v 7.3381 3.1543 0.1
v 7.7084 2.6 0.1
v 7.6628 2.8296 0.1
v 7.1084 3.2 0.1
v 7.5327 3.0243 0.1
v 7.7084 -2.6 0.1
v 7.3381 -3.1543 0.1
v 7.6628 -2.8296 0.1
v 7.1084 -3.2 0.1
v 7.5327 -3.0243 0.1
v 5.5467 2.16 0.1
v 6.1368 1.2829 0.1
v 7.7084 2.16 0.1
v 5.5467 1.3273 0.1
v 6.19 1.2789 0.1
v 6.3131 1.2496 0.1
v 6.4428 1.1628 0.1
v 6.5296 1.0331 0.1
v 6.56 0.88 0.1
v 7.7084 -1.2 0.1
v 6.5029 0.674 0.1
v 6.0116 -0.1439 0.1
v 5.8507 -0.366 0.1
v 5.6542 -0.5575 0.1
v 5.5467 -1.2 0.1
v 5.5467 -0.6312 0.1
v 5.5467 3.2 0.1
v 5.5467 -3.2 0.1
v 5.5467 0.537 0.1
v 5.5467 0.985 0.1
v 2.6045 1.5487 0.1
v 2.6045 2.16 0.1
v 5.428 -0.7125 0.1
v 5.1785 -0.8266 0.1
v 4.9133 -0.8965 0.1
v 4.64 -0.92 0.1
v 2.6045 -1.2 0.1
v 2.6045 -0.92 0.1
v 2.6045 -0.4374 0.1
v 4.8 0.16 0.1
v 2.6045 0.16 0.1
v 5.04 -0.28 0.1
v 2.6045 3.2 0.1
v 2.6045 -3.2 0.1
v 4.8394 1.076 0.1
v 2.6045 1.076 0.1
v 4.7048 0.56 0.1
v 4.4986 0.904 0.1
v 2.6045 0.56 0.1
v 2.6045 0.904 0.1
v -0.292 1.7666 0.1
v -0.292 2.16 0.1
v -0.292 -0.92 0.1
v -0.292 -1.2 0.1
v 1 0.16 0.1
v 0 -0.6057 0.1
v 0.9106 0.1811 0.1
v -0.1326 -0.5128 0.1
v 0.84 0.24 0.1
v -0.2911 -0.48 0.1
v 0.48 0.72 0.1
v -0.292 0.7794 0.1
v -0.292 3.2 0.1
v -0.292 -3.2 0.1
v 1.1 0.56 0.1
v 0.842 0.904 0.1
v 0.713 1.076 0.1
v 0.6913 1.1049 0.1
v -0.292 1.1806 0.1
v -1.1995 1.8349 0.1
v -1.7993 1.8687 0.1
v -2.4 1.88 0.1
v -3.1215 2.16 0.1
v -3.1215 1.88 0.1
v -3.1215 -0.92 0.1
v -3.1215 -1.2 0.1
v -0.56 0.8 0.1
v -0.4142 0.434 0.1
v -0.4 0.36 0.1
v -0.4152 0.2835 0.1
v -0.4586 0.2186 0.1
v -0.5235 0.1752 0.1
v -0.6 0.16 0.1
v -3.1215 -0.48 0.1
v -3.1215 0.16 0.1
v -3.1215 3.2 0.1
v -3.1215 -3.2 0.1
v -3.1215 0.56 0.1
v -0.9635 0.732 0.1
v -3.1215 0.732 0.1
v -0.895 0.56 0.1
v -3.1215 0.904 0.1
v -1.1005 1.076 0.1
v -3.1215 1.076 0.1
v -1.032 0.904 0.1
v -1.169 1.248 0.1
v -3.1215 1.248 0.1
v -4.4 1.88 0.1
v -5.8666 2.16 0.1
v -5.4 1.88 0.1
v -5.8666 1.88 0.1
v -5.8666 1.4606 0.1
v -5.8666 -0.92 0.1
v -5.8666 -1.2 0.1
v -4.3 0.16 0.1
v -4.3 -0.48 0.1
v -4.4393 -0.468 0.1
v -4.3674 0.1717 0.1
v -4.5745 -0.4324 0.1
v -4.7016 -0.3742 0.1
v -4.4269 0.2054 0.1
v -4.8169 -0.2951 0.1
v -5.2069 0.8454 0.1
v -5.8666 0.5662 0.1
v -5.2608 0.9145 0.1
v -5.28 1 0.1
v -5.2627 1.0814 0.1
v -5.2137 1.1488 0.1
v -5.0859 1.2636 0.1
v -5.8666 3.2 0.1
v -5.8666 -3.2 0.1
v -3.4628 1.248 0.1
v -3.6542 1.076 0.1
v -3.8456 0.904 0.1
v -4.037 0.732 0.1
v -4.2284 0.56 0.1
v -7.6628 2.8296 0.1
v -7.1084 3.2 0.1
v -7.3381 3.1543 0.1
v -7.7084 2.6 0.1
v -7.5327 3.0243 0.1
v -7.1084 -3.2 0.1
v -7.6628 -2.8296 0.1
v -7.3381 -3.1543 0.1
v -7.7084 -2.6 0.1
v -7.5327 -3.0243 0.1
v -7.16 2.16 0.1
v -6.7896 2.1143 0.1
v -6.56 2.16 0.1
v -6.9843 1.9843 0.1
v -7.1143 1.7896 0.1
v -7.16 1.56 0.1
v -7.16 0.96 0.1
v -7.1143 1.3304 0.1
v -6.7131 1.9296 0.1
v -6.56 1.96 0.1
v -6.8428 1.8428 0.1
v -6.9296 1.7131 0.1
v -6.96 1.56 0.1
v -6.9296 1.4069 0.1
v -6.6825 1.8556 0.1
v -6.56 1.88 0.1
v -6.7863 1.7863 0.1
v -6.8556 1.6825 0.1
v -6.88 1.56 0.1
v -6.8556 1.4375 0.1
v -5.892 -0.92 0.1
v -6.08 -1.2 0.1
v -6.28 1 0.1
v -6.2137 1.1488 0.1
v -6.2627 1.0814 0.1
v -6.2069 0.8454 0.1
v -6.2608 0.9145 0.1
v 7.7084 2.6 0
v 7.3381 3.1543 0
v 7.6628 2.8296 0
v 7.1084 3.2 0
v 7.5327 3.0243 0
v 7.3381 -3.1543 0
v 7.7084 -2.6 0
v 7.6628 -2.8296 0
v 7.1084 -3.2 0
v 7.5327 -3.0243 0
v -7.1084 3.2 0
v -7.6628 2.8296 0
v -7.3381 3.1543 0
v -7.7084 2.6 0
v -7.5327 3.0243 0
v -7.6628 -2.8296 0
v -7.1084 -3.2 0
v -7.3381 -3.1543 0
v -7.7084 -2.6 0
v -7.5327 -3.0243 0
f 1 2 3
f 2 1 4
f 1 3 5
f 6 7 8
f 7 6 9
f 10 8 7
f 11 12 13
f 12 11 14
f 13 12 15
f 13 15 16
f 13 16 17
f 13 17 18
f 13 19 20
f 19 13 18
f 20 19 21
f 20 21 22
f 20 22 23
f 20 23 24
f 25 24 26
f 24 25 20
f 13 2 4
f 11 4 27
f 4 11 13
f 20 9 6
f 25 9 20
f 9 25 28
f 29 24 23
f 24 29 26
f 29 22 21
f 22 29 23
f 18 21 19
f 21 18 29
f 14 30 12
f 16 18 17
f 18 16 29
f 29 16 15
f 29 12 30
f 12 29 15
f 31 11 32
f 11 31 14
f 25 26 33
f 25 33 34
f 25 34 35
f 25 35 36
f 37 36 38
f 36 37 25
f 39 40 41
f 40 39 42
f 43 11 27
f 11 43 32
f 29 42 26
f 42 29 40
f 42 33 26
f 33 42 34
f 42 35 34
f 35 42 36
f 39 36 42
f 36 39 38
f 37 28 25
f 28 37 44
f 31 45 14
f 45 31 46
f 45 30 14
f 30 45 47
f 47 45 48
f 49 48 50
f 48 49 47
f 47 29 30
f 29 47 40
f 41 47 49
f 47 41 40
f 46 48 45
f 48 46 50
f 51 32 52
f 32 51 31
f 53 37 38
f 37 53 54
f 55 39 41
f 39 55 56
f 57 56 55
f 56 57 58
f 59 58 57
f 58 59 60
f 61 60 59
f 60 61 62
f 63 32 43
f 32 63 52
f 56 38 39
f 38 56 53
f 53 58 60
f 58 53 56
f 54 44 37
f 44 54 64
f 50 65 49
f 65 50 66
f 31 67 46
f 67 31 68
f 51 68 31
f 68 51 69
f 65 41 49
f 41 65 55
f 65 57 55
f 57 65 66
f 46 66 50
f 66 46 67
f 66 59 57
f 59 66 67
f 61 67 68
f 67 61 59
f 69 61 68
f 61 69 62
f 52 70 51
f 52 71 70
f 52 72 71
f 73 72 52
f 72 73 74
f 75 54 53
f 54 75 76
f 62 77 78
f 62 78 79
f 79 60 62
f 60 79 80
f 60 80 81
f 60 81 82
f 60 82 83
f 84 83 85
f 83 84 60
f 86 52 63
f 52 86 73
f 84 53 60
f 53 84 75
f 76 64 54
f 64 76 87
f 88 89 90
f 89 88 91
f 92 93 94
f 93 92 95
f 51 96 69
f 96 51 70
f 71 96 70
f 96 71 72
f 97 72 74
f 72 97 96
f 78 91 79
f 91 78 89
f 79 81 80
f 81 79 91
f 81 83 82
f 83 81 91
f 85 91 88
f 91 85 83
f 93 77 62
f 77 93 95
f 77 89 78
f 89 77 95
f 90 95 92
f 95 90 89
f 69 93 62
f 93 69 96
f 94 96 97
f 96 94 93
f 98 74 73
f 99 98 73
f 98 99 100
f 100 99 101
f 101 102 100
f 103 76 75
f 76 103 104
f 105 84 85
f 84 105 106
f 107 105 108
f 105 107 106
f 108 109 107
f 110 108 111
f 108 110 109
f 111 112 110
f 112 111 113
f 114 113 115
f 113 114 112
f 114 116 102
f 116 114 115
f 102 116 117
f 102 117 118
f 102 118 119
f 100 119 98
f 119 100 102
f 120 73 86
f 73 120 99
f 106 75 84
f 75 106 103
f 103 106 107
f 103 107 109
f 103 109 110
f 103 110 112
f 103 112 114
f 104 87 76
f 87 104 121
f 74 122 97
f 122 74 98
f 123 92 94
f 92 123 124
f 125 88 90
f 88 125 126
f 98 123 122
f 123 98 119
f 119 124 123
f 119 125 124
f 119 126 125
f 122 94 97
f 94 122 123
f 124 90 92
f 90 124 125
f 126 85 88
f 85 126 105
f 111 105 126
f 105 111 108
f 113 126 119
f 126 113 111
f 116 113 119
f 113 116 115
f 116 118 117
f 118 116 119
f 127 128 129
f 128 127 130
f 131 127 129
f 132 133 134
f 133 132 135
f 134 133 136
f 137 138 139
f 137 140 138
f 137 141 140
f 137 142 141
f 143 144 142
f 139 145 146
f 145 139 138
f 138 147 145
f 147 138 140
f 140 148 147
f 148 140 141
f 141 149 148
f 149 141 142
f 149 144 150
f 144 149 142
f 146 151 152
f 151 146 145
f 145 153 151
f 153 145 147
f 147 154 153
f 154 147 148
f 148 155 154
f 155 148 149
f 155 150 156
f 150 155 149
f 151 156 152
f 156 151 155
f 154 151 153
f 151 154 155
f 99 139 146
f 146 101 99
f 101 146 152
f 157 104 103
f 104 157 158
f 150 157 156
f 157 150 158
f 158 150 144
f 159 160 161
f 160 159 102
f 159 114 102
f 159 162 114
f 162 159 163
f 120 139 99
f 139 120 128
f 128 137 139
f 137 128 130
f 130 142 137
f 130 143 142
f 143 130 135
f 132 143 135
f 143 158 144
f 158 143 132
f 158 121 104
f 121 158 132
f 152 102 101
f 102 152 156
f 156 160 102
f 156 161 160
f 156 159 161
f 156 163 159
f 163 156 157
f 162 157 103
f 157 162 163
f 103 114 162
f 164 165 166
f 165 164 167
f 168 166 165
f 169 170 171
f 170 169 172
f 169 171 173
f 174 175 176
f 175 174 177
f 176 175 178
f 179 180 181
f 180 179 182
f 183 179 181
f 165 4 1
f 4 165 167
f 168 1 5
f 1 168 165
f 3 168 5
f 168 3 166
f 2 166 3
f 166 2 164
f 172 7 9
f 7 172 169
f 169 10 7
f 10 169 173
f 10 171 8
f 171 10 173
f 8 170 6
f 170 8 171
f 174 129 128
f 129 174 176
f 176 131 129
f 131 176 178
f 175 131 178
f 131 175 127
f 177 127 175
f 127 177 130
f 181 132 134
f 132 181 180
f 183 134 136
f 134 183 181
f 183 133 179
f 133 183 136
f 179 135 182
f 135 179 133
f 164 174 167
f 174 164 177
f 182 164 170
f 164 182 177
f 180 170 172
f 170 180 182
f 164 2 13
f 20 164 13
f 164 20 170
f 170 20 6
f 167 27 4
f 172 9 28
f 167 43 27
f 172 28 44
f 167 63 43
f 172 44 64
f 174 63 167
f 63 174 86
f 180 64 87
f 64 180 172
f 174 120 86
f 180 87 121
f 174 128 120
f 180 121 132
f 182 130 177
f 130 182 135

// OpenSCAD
use <../lib.scad>
use <s/6142617ks01.scad>
use <s/6142617ks02.scad>
use <s/6142617ks03.scad>
use <s/6142617ks04.scad>
use <s/6142617ks05.scad>
use <s/6142617ks06.scad>
use <s/6142617ks07.scad>
function ldraw_lib__6142617k() = [
// 0 Sticker  0.8 x  1.9 with Taillamp on Red Background Right (Needs work)
// 0 Name: 6142617k.dat
// 0 Author: Massimo Maso [Sirio]
// 0 !LDRAW_ORG Part UPDATE 2023-06
// 0 !LICENSE Licensed under CC BY 4.0 : see CAreadme.txt
// 
// 0 !HELP Needs work: Some parts (light grey and white areas) should be halftones.
// 0 !HELP I indicated them as halftone color code disc - color code ndis.
// 0 !HELP For now I don't have enough information to create the matrix of dots.
// 
// 0 BFC CERTIFY CCW
  [0,"BFC","CERTIFY"],
  [0,"BFC","CCW"],
// 
// 0 !KEYWORDS Camaro, Chevrolet, Drag, Race, Set 75874, Speed Champions, SS
// 
// 0 !HISTORY 2023-11-19 [OrionP] Official Update 2023-06
// 
// 
// 1 16 13.8789 0 0 0 0 1 0 1 0 -1 0 0 s\6142617ks01.dat
  [1,16,13.8789,0,0,0,0,1,0,1,0,-1,0,0, ldraw_lib__s__6142617ks01()],
// 1 16 13.8547 0 0 0 0 1 0 1 0 -1 0 0 s\6142617ks02.dat
  [1,16,13.8547,0,0,0,0,1,0,1,0,-1,0,0, ldraw_lib__s__6142617ks02()],
// 1 16 -.7172 0 0 0 0 1 0 1 0 -1 0 0 s\6142617ks03.dat
  [1,16,-.7172,0,0,0,0,1,0,1,0,-1,0,0, ldraw_lib__s__6142617ks03()],
// 1 16 -.7428 0 0 0 0 1 0 1 0 -1 0 0 s\6142617ks04.dat
  [1,16,-.7428,0,0,0,0,1,0,1,0,-1,0,0, ldraw_lib__s__6142617ks04()],
// 1 16 -14.6522 0 0 0 0 1 0 1 0 -1 0 0 s\6142617ks05.dat
  [1,16,-14.6522,0,0,0,0,1,0,1,0,-1,0,0, ldraw_lib__s__6142617ks05()],
// 1 16 -14.681 0 0 0 0 1 0 1 0 -1 0 0 s\6142617ks06.dat
  [1,16,-14.681,0,0,0,0,1,0,1,0,-1,0,0, ldraw_lib__s__6142617ks06()],
// 1 16 0 0 0 0 0 1 0 1 0 -1 0 0 s\6142617ks07.dat
  [1,16,0,0,0,0,0,1,0,1,0,-1,0,0, ldraw_lib__s__6142617ks07()],
];
module ldraw_lib__6142617k(step=0, col=false, unit=2/5, alt=false, line=0.2, solid=!$preview)
    makepoly(ldraw_lib__6142617k(), step=step, col=col, unit=unit, alt=alt, line=line, solid=solid);
ldraw_lib__6142617k(line=0.2);
